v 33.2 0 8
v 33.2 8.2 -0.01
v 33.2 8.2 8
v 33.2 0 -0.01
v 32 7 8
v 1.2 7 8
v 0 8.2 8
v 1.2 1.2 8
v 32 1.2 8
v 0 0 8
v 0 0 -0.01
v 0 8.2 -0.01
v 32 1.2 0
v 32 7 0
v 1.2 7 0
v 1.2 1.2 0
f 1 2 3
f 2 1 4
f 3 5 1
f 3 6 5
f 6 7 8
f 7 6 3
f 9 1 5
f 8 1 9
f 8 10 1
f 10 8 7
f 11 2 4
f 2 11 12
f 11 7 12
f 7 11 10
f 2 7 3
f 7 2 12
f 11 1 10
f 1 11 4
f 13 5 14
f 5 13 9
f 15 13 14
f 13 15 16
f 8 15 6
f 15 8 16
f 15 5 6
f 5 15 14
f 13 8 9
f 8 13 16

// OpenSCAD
// file: ../Base/Rotation.scad
// Fischertechnik Box Foundation
// Geometry Helpers Rotation

include <PlacementOptions.scad>

// getRotatedSpace(space, rotation=NoRotation)
// Rotates the space dependent on the specified rotation

function getRotatedSpace(space, rotation=NoRotation) = [
    (rotation == Rotate90 || rotation == Rotate270) ? space.y : space.x,
    (rotation == Rotate90 || rotation == Rotate270) ? space.x : space.y
];

// Rotates the given space around the fixed left lower corner
// space = the space the children needs as width/depth list [width,depth]
// rotation = 0 Rotate0 degrees, 1 Rotate90 degrees, 2 Rotate180 degrees, 3 Rotate270 degrees (equivalent to -90)

module RotateFix(space, rotation=NoRotation) {
    dy = (rotation == Rotate0 || rotation == Rotate270) ? 0 :
        (rotation == Rotate90) ? space.x :
        space.y;
    dx = (rotation < Rotate180) ? 0 :
        (rotation == Rotate180) ? space.x :
        space.y;
    
    translate([dx, dy, 0])
        rotate([0, 0, rotations[rotation]])
            children();
}
// file: ../Base/Alignment.scad
// Fischertechnik Box Foundation
// Geometry Helpers Alignment

include <PlacementOptions.scad>

// getAlignedX(elementWidth, spaceWidth, align=AlignRight, offset=0)
// Gets the aligned X offset of an element with the given
// width in the given space.
// elementWidth = The width of the element to positon
// spaceWidth = The space where the element should be aligned
// align = 0 AlignLeft, 1 AlignCenter, 2 AlignRight
// offset = an optional offset from the aligned position. When
// aligned left or centered, then positive values are in X direction.
// When aligned right then positive values are in negative X direction.

function getAlignedX(elementWidth, spaceWidth, align=AlignRight, offset=0) =
    (align == AlignLeft) ?
        offset :
        ((align == AlignCenter) ?
        (spaceWidth - elementWidth)/2 + offset :
        spaceWidth - offset - elementWidth);

// getAlignedY(elementDepth, spaceDepth, align=AlignTop, offset=0)
// Gets the aligned Y offset of an element with the given
// depth in the given space.
// elementDepth = The depth of the element to positon
// spaceDepth = The space where the element should be aligned
// align = 0 AlignBottom, 1 AlignCenter, 2 AlignTop
// offset = an optional offset from the aligned position. When
// aligned bottom or centered, then positive values are in Y direction.
// When aligned top then positive values are in negative Y direction.

function getAlignedY(elementDepth, spaceDepth, align=AlignTop, offset=0) =
    (align == AlignBottom) ?
        offset :
        ((align == AlignCenter) ?
        (spaceDepth - elementDepth)/2 + offset :
        spaceDepth - offset - elementDepth);
// file: ../Base/PlacementOptions.scad
// Fischertechnik Box Foundation
// Placement Options

// Alignment
NoAlign = 0;
AlignLeft = 1;
AlignBottom = 2;
AlignCenter = 3;
AlignRight = 4;
AlignTop = 5;

// Element rotation degree steps
rotations = [0, -90, -180, -270];

// Rotation
NoRotation = 0;
Rotate0 = 0;
Rotate90 = 1;
Rotate180 = 2;
Rotate270 = 3;

// Docking (seen from above)
NoDock = -1;
DockLeft = 0;
DockTop = 1;
DockRight = 2;
DockCorner = 2;
DockBottom = 3;

// Web corners
LowerLeft = 0;
UpperLeft = 1;
UpperRight = 2;
LowerRight = 3;

// Web position relative to corner
LeftOfCorner = 0;
RightOfCorner = 1;

// Rails direction
Horizontal = true;
Vertical = false;
// file: ../Base/Boxes.scad
// Fischertechnik Box Foundation
// Pre-designed Boxes

use <Constants.scad>

include <PlacementOptions.scad>

box190Width = 190;
box190Depth = 130;
box130Width = 130;
box130Depth = 95;

// Values are from an original ec3 box
topBottomDifference = 1.5;
outerHeight = 40;
baseThickness = 1.8;
innerHeight = outerHeight - baseThickness;
stackExcess = 5.7;
radius = 3.5;
wallThickness = 1.5;
tolerance = 0.2;

boxWallThickness = wallThickness;
boxBaseThickness = baseThickness;
boxWebWidth = 3.0;

// getBoxWallThickness()
// Gets the wall thickness of a Fischertechnik Box
function getBoxWallThickness() = boxWallThickness;

// getBoxUsageHeight(height = 38.2)
// Gets the usable height of a Fischertechnik box
// height = Outer height of the box from the bottom to the upper edge.
function getBoxUsageHeight(height = outerHeight) = height - baseThickness - stackExcess;

// getBoxInnerHeight()
// Gets the inner height of a Fischertechnik box, including the stack excess
function getBoxInnerHeight() = innerHeight;

// getBoxBaseThickness()
// Gets the thickness of the Fischertechnik box base.
function getBoxBaseThickness() = boxBaseThickness;

// getBoxWebWidth()
// Gets the width of a box web
function getBoxWebWidth() = boxWebWidth;

// getBox190Space()
// Gets the usable inner space of a Box 190 as an x/y-list
function getBox190Space() = [
    box190Width - 2*getBoxWallThickness() - topBottomDifference, 
    box190Depth - 2*getBoxWallThickness() - topBottomDifference ];

// RoundedCornerPlate(width, depth, height, radius)
// Creates a body plate with rounded corners for a box. Used
// also to create the complete box with the hull module.
// width = Width of the plate
// depth = depth of the plate 
// height = thickness of the plate
// radius = radius of the rounded corner
module RoundedCornerPlate(width, depth, height, radius) {
    translate([radius, radius])
    hull() {
        w = width-2*radius;
        d = depth-2*radius;
        cube([w, d, height]);
        cylinder(height, r=radius, $fn=getFragments());
        translate([w, 0])
            cylinder(height, r=radius, $fn=getFragments());
        translate([w, d])
            cylinder(height, r=radius, $fn=getFragments());
        translate([0, d])
            cylinder(height, r=radius, $fn=getFragments());
    }
}

// BoxBase(width, depth)
// Creates an empty stackable Fischertechnik compatible box
// width = Outer width of the box (190, 130, ...)
// depth = Outer depth of the box (130, 95, ...)

module BoxBase(width, depth, height=outerHeight) {    
    thinPlate = 0.01;

    innerHeight = height - baseThickness;    
    
    module Body(tolerance=tolerance) {
        hull() {
            // Bottom with tolerance to fit into the original boxes when stacked
            translate([-wallThickness+tolerance, -wallThickness+tolerance, -baseThickness])
                RoundedCornerPlate(width-topBottomDifference-2*tolerance, depth-topBottomDifference-2*tolerance, thinPlate, radius);
            
            // Top
            translate([-wallThickness-topBottomDifference/2, -wallThickness-topBottomDifference/2, innerHeight-thinPlate])
                RoundedCornerPlate(width, depth, thinPlate, radius);
         }
    }

    module Cutoff() {
        hull() {
            coWidth = width - 2*wallThickness;
            coDepth = depth - 2*wallThickness;
            
            // Bottom
            RoundedCornerPlate(coWidth-topBottomDifference, coDepth-topBottomDifference, thinPlate, radius);

            // Top
            translate([-topBottomDifference/2, -topBottomDifference/2, innerHeight+thinPlate]) 
                RoundedCornerPlate(coWidth, coDepth, thinPlate, radius);
        }
    }
    
    difference() {        
        Body();
        Cutoff();
        stackOffset = innerHeight - stackExcess;
        translate([0, 0, stackOffset + baseThickness])
            Body(tolerance=0);
    }
}

// Creates the Fischertechnik empty box 130x190 mm and places it at position 0,0
// 190x130 are the outer sizes, the inner space is slightly smaller. Use getBox190Space() to get the inner sizes.
// The box is positioned that the usable inner space is at the 0,0,0 position.

module Box190() {
    BoxBase(box190Width, box190Depth);
}

// Gets the usable inner space of a Box 130 as an x/y-list
function getBox130Space() = [
    box130Width - 2*getBoxWallThickness() - topBottomDifference, 
    box130Depth - 2*getBoxWallThickness() - topBottomDifference ];

// Creates the Fischertechnik empty box 95x130 mm and places it at position 0,0
// 190x130 are the outer sizes, the inner space is slightly smaller. Use getBox190Space() to get the inner sizes.
// The box is positioned that the usable inner space is at the 0,0,0 position.

module Box130() {
    BoxBase(box130Width, box130Depth);
}

// Creates a web at the specified box walls
// corner 0 = LowerLeft, 1 = UpperLeft, 2 = UpperRight, 3 = LowerRight
// side 0 = LeftOfCorner, 1 = RightOfCorner
// distance = Distance in mm from the corner
// boxSpace = inner width and depth of the box (default: Box 190)
// webWidth = length of the web (default is 3 mms)
// webThickness = thickness of the web (default is 1 mm)
// height = Height of the web (standard is getBoxUsageHeight())
// sink = How much of the web is sunk into the wall

module BoxWeb(
    corner, 
    side, 
    distance, 
    boxSpace=getBox190Space(), 
    webWidth=getBoxWebWidth(), 
    webThickness=1.0, 
    height=getBoxUsageHeight(),
    sink = getBoxWallThickness()/2) {
    width = (corner % 2 == 0) ? 
            (side == LeftOfCorner ? webWidth : webThickness) :
            (side == LeftOfCorner ? webThickness : webWidth);

    depth = (corner % 2 == 0) ? 
            (side == RightOfCorner ? webWidth : webThickness) :
            (side == RightOfCorner ? webThickness : webWidth);
    
    xDiff = corner == LowerLeft ? 
                (side == LeftOfCorner ? -sink : distance) :
            (corner == UpperLeft ?                
                (side == LeftOfCorner ? distance : -sink) :
            (corner == UpperRight ?
                (side == LeftOfCorner ? boxSpace.x-webWidth+sink : boxSpace.x-distance-webThickness) :
                (side == LeftOfCorner ? boxSpace.x-distance-webThickness: boxSpace.x-webWidth+sink)));

    yDiff = corner == LowerLeft ? 
                (side == RightOfCorner ? -sink : distance) :
            (corner == UpperLeft ?
                (side == RightOfCorner ? boxSpace.y-distance-webThickness : boxSpace.y-webWidth+sink) :
            (corner == UpperRight ?
                (side == RightOfCorner ? boxSpace.y-webWidth+sink : boxSpace.y-distance-webThickness) :
                (side == RightOfCorner ? distance : -sink)));
    
    translate([xDiff, yDiff, -getExcess()])
        cube([width, depth, height + 2*getExcess()]);
}
// file: ../Base/Placement.scad
// Fischertechnik Box Foundation
// Geometry Helpers Placement

use <Constants.scad>
use <Alignment.scad>
use <Rotation.scad>
use <Boxes.scad>

include <PlacementOptions.scad>

// Place(x=0, y=0, elementSpace=[0,0], alignX=AlignLeft, alignY=AlignBottom, rotation=Rotate0, boxSpace=getBox190Space())
// Places the child at the specified position
// y = Y-Position. This is a relative position when an X aligment is specified.
// x = X-Position. This is a relative position when an Y aligment is specified.
// elementSpace = space of the element to be placed [x,y]
// alignX = -1=NoAlign, 0 AlignLeft, 1 AlignCenter, 3 AlignRight (elementSpace and boxSpace required!)
// alignY = -1=NoAlign, 2 AlignBottom, 1 AlignCenter, 4 AlignTop (elementSpace and boxSpace required!)
// rotation = 0 Rotate0 0 degrees, 1 Rotate90 90 degrees, 
// 2 Rotate180 180 degrees, 3 Rotate270 270 degrees (equivalent to -90)
// boxSpace = Inner space of the box where the placement occurs [x,y] - default is Box 190x130 inner space

module Place(x=0, y=0, elementSpace=[0,0], 
  alignX=AlignLeft, alignY=AlignBottom, 
  rotation=NoRotation, boxSpace=getBox190Space()) {

    module Position(x, y, space, rotation=Rotate0) {
        translate([x, y, 0])
            RotateFix(space, rotation)
                children();
    }

    space = getRotatedSpace(elementSpace, rotation);
    alignedX = getAlignedX(space.x, boxSpace.x, alignX, x);
    alignedY = getAlignedY(space.y, boxSpace.y, alignY, y);
    Position(alignedX, alignedY, elementSpace, rotation)
        children();
}

// Center(space=getBox130Space(), elementSpace=[0,0])
// space = Space where the children is centered. For cylinder use centered=true and no elementSpace.
// elementSpace = space of the element to be centered [x,y]

module Center(space=getBox190Space(), elementSpace=[0,0]) {
    Place(elementSpace=elementSpace, boxSpace=space, alignX=AlignCenter, alignY=AlignCenter)
        children();
}

// CenterHorizontal(width=0, y=0, offset=0, space=getBox130Space())
// width = Width of the element to be placed.
// y = Y position of the element
// offset = Offset from the center position (negative will be left of the center)
// space = Space where the element is placed

module CenterHorizontal(width=0, y=0, offset=0, space=getBox190Space()) {
    Place(x=offset, y=y, elementSpace=[width, 0], boxSpace=space, alignX=AlignCenter)
        children(0);
}

// CenterVertical(depth=0, x=0, offset=0, space=getBox130Space())
// depth = Depth of the element to be placed.
// x = X position of the element
// offset = Offset from the center position (negative will be down of the center)
// space = Space where the element is placed

module CenterVertical(depth=0, x=0, offset=0, space=getBox190Space()) {
    Place(x=x, y=offset, elementSpace=[0, depth], boxSpace=space, alignY=AlignCenter)
        children(0);
}

// getIsVertical(align)
// True if the specified alignment needs a vertical orientation for a divider (AlignRight, AlignLeft)

function getIsVertical(align) = (align == AlignRight || align == AlignLeft);

// getIsHorizontal(align)
// True if the specified alignment needs a horizontal orientation for a divider (AlignTop, AlignBottom)

function getIsHorizontal(align) = (align == AlignTop || align == AlignBottom);
// file: ../Base/Constants.scad
// Fischertechnik Box Foundation
// Constants

// Constant values necessary for multiple elements

// Base constants
dividerThickness = 1.2;
excess = 0.01;
fragments = 90;
tolerance = 0.8;

// Gets the thickness of a divider 
function getDividerThickness() = dividerThickness;

// Gets the excess that is used to merge walls into each other
function getExcess() = excess;

// Gets amount of fragments of a cylinder
function getFragments() = fragments;

// Gets the inner tolerance of a frame to each side
function getTolerance() = tolerance;


// Fischertechnik specific constants
axisDiameter = 4;
axisBottomDiameter = axisDiameter + 1;
axisTolerance = 0.2;
axisLockingLength = 8;

// Gets axis diameter of Fischertechnik axis
function getAxisDiameter() = axisDiameter;

// Gets axis diameter tolerance (subtracted for element axis)
function getAxisTolerance() = axisTolerance;

// Gets the axis diameter for standing axis
function getStandAxisDiameter() = getAxisDiameter() - getAxisTolerance();

// Gets axis bottom diameter for thicker part at the bottom
function getAxisBottomDiameter() = axisBottomDiameter;

// Gets the lengthh of the locking part of a locking axis
function getAxisLockingLength() = axisLockingLength;

pinHeight = 2.5;
pinTolerance = 0.2;

// gets the height of a connecting pin
function getPinHeight() = pinHeight;

// gets the connecting pin height tolerance
function getPinTolerance() = pinTolerance;

standardEdgeDistance = 2.5;
standardWebDistance = 11.5;
standardCornerLength = 15;

// gets the standard distance to the wall of the box for dockable frames with webs
function getStandardEdgeDistance() = standardEdgeDistance;

// gets the standard distance of each web to the corner of the dockable frame
function getStandardWebDistance() = standardWebDistance;

// gets the standard length of the corner walls of a dockable frame
function getStandardCornerLength() = standardCornerLength;

tubeWallFactor = 0.8;

// gets the wall thickness of a tube.
function getTubeWallThickness() = tubeWallFactor * getDividerThickness();

smallPartsFrameHeight = 20;

// gets the frame height for docked small parts boxes.
function getSmallPartsFrameHeight() = smallPartsFrameHeight;

hubRingDiameter = 19.5;
hubRingLevelDiameter = 21;

// gets the diameter of a tube matching the inner ring of a wheel
function getHubRingDiameter() = hubRingDiameter;

// gets the diameter of a hub tube with a thicker diameter
function getHubRingLevelDiameter() = hubRingLevelDiameter;
// main file
// Fischertechnik Box Library
// Frame for building plate 5x15x30
// 32330

use <../ModelBase/Simple.scad>

/* [Element Parameters] */
count = 1;

/* [Hidden] */
width = 30;
depth = 5;
height = 8;

// getFrameBuildingPlate5x15x30Space(columns=1, rows=1)
// Gets the space of a frame for count building plates

function getFrameSmallBlockSpace(count=1) = getFrameOuterVolume([width, depth * count, height]);

// FrameBuildingPlate5x15x30(count=1)
// Frame for count building plates 5x15x30

module FrameBuildingPlate5x15x30(count=1) {
    Frame([width, depth * count, height]);
}

// Tests
color("lightgray")
FrameBuildingPlate5x15x30(count);
